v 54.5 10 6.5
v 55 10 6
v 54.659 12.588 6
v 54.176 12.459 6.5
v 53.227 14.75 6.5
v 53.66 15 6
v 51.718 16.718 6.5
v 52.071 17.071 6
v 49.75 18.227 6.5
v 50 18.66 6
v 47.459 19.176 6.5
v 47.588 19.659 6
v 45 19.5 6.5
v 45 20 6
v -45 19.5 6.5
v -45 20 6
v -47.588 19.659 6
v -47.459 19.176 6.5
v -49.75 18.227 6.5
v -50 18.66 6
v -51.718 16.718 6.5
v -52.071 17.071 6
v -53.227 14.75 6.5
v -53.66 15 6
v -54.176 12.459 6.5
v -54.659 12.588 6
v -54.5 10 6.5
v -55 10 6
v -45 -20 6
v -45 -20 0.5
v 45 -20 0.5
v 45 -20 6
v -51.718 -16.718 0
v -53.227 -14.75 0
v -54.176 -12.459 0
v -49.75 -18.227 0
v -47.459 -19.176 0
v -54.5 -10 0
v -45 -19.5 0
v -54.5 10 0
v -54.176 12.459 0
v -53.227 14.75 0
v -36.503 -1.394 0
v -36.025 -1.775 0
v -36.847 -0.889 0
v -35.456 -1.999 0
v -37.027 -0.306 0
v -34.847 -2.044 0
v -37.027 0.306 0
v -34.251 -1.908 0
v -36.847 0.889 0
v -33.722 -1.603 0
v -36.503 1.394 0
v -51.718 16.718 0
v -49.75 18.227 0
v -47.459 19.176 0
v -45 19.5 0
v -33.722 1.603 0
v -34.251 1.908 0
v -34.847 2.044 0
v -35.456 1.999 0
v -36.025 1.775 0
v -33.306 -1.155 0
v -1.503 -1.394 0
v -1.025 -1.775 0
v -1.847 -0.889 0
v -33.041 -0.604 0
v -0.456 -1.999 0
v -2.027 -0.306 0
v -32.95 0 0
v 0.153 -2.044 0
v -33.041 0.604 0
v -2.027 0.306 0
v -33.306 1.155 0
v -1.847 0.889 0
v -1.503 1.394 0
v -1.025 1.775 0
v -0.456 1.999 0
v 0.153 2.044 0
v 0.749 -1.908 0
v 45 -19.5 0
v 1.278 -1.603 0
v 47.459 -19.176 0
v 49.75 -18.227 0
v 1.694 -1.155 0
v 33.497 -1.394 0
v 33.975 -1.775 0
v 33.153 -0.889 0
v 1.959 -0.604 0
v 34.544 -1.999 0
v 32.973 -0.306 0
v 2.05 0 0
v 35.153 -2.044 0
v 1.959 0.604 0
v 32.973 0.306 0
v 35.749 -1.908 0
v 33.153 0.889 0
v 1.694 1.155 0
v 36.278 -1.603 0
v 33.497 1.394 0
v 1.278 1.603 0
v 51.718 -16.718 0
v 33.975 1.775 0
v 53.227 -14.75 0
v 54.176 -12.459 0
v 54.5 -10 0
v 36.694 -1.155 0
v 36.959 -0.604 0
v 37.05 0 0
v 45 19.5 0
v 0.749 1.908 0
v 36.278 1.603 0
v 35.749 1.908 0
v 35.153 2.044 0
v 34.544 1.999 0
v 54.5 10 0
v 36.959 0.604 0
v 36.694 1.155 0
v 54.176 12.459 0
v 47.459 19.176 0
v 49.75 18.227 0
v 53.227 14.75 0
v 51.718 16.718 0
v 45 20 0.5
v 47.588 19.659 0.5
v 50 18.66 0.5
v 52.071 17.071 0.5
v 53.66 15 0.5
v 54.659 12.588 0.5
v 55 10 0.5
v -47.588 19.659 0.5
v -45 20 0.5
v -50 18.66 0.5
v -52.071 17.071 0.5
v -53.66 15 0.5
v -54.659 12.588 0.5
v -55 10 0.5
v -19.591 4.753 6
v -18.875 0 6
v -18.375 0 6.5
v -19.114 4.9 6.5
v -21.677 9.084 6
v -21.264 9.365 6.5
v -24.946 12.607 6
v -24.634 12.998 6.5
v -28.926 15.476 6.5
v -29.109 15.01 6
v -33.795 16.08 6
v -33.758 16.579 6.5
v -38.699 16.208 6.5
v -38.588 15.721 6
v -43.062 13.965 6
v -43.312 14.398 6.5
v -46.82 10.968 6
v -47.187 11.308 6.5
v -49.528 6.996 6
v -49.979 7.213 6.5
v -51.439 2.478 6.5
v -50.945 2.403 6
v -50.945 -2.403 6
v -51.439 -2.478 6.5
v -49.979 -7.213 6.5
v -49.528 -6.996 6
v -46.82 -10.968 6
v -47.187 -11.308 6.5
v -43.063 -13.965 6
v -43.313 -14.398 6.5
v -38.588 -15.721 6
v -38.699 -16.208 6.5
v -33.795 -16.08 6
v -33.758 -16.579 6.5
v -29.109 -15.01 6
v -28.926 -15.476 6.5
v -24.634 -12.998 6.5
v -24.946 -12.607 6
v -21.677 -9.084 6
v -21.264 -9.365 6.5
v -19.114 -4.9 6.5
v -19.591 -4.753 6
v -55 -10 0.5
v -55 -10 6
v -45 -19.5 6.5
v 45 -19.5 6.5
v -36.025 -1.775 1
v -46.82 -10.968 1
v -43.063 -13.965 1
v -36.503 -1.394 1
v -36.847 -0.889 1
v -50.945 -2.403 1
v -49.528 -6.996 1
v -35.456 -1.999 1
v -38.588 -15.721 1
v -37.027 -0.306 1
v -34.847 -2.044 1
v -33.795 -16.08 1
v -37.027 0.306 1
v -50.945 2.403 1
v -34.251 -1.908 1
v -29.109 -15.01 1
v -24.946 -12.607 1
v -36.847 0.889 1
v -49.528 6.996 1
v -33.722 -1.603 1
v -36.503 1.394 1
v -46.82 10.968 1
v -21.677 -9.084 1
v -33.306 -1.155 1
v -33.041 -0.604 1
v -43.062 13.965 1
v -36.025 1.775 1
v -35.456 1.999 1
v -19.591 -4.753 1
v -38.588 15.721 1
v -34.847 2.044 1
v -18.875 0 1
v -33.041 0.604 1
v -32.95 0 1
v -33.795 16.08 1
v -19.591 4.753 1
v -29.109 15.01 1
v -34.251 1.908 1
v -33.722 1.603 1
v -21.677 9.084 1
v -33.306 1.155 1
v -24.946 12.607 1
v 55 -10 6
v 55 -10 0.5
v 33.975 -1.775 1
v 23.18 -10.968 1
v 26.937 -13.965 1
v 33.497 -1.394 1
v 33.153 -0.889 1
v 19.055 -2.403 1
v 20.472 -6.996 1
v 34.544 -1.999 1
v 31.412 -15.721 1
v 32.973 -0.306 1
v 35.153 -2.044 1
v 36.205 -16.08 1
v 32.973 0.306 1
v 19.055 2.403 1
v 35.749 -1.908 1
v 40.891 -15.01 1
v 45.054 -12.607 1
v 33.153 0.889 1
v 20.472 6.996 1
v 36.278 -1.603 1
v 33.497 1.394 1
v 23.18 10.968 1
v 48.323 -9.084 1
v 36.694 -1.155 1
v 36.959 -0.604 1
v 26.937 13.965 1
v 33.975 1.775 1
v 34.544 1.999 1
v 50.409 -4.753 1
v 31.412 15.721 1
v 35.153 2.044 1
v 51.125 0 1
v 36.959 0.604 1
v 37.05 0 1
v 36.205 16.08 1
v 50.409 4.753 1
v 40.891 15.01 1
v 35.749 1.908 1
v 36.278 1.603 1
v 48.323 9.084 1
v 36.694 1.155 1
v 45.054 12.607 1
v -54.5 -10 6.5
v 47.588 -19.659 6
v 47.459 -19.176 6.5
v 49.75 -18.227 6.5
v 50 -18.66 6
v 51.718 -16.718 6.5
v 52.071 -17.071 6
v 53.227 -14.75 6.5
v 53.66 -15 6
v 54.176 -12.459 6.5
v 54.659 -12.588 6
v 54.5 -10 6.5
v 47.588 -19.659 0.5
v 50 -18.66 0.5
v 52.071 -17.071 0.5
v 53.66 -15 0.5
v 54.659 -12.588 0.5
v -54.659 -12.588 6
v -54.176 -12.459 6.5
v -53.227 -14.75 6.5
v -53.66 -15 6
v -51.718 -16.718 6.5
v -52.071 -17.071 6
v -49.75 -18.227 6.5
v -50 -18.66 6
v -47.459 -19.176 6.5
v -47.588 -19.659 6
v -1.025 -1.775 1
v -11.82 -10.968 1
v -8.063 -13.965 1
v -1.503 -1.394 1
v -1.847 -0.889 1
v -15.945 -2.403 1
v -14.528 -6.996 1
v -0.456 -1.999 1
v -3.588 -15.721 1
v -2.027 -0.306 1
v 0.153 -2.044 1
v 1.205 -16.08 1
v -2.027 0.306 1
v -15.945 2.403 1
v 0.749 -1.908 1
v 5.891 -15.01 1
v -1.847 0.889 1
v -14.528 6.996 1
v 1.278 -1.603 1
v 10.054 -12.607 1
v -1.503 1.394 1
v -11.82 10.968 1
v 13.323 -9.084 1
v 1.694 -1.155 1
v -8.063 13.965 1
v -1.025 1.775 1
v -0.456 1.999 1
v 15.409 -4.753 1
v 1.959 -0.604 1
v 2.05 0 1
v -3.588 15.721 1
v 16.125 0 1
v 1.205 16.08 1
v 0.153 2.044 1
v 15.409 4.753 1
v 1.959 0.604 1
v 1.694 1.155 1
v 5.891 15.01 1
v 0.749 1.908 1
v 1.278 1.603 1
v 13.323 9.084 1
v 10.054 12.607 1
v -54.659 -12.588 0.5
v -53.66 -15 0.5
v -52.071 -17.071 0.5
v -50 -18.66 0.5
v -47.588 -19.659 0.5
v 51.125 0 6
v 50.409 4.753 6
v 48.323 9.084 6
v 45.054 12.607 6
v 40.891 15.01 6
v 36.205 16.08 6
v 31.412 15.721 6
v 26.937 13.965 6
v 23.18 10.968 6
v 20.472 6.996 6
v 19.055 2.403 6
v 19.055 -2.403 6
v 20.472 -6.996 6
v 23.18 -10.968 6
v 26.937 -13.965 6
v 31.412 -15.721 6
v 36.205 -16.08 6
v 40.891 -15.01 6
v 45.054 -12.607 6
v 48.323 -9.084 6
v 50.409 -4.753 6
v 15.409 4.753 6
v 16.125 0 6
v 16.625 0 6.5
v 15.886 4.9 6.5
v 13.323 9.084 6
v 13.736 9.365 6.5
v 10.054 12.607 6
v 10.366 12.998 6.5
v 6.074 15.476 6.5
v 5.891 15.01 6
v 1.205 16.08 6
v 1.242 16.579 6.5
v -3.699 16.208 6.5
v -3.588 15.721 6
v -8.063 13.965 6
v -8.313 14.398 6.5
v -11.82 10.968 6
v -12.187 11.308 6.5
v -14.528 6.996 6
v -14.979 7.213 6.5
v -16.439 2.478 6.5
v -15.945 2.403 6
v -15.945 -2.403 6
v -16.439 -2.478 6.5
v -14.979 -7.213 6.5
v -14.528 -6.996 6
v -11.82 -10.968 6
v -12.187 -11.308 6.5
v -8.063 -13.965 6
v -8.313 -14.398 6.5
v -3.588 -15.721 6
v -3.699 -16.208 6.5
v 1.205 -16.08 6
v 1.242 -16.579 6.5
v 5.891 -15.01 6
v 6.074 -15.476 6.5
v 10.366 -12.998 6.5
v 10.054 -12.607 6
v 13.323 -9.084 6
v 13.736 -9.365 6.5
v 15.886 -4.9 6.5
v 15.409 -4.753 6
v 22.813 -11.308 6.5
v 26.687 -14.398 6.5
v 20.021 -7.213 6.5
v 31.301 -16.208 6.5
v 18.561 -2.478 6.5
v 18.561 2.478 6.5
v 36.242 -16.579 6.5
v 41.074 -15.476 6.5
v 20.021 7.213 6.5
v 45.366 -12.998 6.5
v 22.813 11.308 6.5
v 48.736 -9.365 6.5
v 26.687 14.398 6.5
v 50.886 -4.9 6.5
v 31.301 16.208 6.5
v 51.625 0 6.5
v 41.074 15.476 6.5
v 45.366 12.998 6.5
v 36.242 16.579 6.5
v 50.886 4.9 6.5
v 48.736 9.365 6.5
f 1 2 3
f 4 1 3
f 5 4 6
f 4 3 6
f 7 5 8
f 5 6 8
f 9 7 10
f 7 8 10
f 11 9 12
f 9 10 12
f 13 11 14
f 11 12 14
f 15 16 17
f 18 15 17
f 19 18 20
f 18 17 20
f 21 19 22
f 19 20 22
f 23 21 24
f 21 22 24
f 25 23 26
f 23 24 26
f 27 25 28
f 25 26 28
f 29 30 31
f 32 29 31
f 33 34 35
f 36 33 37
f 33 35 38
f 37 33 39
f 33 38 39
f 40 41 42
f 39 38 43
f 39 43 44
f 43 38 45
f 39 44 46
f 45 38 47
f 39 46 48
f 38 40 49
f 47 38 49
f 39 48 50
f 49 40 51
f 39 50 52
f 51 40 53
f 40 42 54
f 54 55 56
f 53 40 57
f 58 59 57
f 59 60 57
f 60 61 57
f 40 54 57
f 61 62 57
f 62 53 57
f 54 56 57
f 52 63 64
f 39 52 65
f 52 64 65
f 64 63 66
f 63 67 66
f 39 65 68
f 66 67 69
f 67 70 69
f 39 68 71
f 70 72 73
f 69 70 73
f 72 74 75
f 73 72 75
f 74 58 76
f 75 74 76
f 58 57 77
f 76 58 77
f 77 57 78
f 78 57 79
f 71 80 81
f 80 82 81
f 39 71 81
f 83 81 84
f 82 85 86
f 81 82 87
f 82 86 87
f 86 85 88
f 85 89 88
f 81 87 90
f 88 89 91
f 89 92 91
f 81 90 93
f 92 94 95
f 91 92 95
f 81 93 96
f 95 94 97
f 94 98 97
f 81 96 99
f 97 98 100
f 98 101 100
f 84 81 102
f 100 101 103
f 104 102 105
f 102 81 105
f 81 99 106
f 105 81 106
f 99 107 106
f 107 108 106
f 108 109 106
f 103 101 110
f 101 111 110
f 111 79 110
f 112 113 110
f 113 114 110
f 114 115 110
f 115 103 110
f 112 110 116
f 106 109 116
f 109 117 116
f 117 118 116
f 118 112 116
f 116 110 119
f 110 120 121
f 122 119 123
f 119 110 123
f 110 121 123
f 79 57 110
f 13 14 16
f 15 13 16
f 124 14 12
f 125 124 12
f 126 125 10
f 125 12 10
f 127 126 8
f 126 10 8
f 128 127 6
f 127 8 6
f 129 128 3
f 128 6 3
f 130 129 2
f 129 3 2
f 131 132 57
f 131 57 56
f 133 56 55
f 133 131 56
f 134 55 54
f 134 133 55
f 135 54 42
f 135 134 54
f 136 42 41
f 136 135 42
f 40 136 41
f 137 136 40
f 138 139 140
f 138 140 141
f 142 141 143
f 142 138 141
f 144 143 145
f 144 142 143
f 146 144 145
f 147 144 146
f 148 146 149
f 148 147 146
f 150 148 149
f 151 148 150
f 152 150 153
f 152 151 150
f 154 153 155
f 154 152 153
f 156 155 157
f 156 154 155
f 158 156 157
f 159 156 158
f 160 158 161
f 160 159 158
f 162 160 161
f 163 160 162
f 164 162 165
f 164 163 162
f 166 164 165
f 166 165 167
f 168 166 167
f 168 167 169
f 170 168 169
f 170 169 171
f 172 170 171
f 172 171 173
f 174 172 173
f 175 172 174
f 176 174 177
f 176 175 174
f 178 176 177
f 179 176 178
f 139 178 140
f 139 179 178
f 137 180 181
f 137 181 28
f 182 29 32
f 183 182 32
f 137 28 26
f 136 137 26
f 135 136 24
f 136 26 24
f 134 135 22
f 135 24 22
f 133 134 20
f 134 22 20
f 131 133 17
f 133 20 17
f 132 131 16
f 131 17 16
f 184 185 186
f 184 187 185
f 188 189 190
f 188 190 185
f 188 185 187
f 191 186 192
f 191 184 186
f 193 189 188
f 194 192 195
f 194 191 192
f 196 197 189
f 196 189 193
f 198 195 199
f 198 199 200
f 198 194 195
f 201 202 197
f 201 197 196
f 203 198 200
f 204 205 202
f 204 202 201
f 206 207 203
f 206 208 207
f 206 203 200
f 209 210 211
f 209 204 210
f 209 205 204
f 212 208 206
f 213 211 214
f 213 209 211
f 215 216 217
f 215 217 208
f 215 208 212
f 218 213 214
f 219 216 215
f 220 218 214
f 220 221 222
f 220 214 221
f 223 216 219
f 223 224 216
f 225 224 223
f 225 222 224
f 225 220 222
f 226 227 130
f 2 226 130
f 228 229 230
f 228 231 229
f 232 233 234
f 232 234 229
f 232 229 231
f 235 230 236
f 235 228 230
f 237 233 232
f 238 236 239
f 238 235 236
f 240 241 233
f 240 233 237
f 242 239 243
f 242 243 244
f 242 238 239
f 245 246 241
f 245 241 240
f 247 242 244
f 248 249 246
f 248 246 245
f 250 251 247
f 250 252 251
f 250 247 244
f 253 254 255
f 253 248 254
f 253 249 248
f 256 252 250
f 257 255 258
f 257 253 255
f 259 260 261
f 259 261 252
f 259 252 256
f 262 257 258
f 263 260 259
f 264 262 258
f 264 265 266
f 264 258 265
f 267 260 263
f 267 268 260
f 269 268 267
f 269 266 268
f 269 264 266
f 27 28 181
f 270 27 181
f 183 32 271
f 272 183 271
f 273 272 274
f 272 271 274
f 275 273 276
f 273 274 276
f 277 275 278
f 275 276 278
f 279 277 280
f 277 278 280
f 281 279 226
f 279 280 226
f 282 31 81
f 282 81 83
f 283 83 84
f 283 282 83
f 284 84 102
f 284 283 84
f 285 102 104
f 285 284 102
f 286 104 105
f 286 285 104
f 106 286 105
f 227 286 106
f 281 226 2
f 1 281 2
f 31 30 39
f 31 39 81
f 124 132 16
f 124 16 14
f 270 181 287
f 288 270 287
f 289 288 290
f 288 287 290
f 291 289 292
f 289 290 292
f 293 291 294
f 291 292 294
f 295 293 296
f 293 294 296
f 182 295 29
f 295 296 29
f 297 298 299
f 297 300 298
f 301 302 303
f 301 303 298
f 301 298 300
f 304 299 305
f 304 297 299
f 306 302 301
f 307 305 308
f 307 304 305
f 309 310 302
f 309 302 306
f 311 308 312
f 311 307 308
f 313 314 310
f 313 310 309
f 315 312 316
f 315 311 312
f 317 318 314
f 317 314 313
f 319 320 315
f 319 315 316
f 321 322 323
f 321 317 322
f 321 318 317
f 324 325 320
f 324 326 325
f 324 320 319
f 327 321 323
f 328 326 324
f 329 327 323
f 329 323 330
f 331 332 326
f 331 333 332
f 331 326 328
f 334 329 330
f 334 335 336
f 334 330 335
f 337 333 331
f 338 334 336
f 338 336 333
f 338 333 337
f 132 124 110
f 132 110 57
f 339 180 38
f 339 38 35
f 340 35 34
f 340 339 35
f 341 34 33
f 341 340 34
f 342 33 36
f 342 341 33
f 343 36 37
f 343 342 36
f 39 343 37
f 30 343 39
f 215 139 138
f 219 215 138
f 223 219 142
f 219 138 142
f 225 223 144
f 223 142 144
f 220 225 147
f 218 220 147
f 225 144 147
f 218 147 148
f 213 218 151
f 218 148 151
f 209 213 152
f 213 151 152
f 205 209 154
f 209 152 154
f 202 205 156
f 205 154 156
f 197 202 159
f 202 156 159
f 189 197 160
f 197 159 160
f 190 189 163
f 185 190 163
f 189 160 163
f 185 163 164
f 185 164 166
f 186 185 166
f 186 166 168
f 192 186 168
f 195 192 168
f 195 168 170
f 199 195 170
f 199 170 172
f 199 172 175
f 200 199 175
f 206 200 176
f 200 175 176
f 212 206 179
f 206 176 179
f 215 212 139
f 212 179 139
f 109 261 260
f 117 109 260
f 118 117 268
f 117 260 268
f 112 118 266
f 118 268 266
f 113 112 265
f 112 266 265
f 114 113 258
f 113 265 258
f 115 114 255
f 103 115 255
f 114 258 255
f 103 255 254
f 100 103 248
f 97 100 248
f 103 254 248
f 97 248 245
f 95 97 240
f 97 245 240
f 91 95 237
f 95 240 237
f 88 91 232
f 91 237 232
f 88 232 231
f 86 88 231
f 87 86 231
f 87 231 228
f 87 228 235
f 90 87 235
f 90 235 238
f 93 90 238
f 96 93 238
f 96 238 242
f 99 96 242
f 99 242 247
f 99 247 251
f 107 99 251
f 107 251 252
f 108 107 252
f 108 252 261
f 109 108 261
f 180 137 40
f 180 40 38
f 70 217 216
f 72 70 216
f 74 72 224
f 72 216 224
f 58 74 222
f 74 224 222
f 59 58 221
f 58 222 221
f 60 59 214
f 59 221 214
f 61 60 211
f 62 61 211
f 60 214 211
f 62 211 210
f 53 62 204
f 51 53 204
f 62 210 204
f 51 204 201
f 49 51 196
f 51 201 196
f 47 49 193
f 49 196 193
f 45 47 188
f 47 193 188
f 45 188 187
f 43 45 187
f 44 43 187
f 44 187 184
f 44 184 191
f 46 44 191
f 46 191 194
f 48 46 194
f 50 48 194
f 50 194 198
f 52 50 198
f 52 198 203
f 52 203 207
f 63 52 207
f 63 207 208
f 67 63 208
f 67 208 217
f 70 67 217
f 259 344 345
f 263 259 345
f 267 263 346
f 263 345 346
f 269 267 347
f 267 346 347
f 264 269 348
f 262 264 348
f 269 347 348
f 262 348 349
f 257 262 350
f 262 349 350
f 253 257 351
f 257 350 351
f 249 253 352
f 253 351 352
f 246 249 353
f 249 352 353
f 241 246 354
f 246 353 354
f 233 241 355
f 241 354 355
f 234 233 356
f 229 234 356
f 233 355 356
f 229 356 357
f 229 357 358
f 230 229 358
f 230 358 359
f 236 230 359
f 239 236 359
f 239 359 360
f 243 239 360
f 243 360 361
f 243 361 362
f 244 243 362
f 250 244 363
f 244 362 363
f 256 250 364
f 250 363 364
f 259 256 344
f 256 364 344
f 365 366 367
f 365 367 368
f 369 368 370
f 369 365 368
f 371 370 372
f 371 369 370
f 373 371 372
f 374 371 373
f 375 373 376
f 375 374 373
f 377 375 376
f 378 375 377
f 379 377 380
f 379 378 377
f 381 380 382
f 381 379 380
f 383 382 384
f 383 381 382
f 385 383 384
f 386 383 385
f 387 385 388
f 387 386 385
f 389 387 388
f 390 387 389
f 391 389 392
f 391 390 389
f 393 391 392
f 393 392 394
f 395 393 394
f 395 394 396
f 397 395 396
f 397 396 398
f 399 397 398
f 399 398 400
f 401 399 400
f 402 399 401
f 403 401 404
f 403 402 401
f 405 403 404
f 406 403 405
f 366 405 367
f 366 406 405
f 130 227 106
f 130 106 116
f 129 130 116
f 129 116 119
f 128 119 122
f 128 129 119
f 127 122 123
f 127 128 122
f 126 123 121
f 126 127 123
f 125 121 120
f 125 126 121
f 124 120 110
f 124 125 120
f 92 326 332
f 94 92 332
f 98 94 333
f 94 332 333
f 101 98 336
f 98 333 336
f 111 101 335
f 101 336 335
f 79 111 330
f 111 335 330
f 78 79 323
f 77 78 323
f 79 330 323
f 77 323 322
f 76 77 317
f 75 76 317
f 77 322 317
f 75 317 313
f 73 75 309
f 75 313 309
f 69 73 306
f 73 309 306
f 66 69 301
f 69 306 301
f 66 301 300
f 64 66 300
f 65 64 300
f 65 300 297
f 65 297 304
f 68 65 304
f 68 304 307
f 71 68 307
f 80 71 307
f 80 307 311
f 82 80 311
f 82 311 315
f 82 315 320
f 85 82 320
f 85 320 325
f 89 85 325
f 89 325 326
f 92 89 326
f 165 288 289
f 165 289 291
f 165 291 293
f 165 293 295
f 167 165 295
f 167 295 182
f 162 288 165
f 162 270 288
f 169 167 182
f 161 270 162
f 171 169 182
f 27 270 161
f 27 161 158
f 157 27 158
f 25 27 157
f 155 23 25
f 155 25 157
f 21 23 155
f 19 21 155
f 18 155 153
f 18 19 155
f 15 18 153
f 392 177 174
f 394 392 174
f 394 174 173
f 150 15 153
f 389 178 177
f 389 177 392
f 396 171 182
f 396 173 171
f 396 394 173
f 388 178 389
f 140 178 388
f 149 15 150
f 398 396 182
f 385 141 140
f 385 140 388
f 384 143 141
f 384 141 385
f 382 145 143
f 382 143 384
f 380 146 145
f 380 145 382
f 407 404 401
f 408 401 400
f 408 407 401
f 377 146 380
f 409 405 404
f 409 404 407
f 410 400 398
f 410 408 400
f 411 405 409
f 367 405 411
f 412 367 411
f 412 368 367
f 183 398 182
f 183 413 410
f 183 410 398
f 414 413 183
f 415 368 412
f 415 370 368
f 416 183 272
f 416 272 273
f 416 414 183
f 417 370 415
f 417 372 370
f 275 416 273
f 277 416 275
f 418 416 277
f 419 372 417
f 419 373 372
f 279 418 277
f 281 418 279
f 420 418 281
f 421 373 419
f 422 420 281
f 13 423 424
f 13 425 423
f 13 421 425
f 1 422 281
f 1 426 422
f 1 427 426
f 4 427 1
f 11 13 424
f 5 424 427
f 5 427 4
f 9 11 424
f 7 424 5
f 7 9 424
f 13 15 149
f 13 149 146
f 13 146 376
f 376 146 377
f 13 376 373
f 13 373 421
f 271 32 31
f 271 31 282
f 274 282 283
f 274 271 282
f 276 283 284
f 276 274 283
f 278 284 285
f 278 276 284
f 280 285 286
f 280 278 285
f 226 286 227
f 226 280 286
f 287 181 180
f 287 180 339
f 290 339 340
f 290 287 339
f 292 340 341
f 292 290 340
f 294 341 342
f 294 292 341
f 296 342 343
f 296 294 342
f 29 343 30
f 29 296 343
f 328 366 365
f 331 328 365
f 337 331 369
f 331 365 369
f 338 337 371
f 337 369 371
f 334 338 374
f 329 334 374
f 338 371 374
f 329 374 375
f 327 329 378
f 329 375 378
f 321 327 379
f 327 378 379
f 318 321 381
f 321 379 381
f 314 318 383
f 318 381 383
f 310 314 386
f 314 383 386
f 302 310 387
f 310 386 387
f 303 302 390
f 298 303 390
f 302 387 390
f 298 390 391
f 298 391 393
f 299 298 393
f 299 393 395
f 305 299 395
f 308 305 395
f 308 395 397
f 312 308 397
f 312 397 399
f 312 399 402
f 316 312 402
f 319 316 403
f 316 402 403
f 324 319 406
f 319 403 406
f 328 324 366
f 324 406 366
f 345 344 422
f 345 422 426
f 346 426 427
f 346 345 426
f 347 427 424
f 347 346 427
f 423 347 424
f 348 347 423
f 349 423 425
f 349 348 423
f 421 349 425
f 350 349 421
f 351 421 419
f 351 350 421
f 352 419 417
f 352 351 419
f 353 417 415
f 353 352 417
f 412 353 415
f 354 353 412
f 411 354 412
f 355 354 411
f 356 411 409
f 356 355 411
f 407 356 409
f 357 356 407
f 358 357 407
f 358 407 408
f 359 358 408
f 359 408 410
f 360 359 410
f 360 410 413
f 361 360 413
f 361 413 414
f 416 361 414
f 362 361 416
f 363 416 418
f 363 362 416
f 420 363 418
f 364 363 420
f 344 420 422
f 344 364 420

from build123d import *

# Parameters (mm, degrees)
SKETCH1_W           = 110
SKETCH1_H           = 40
BOSS_EXTRUDE1_DEPTH = 6.5
SKETCH2_R           = 16.125
CUT_EXTRUDE1_DEPTH  = 5.5
FILLET1_R           = 10
SKETCH3_R           = 2.05
CUT_EXTRUDE2_DEPTH  = 59.781374601
CHAMFER1_SIZE       = 0.5


with BuildPart() as part:
    # Sketch1 → Boss-Extrude1 (new body)
    with BuildSketch(Plane.XY):
        Rectangle(SKETCH1_W, SKETCH1_H)
    extrude(amount=BOSS_EXTRUDE1_DEPTH)

    # Sketch2 → Cut-Extrude1 (cut)
    with BuildSketch(Plane.XY.offset(6.5)):
        Circle(SKETCH2_R)
        with Locations((35, 0)):
            Circle(SKETCH2_R)
        with Locations((-35, 0)):
            Circle(SKETCH2_R)
    extrude(amount=-CUT_EXTRUDE1_DEPTH, mode=Mode.SUBTRACT)

    # Fillet1
    fillet1_edges = [part.edges().sort_by_distance(p)[0] for p in [
        (55, -20, 3.25),
        (-55, -20, 3.25),
        (-55, 20, 3.25),
        (55, 20, 3.25),
    ]]
    fillet(fillet1_edges, radius=FILLET1_R)

    # Sketch3 → Cut-Extrude2 (cut, through all)
    with BuildSketch(Plane.XY.offset(1)):
        Circle(SKETCH3_R)
        with Locations((35, 0)):
            Circle(SKETCH3_R)
        with Locations((-35, 0)):
            Circle(SKETCH3_R)
    extrude(amount=-CUT_EXTRUDE2_DEPTH, mode=Mode.SUBTRACT)

    # Chamfer1
    chamfer1_edges = [part.edges().sort_by_distance(p)[0] for p in [
        (-51.125, 0, 6.5),
        (18.875, 0, 6.5),
        (-16.125, 0, 6.5),
        (55, 0, 0),
        (55, 0, 6.5),
        (0, -20, 0),
        (-55, 0, 0),
        (0, 20, 0),
        (-52.071067812, -17.071067812, 0),
        (-52.071067812, 17.071067812, 0),
        (52.071067812, 17.071067812, 0),
        (52.071067812, -17.071067812, 0),
        (0, -20, 6.5),
        (0, 20, 6.5),
        (-55, 0, 6.5),
        (-52.071067812, -17.071067812, 6.5),
        (-52.071067812, 17.071067812, 6.5),
        (52.071067812, 17.071067812, 6.5),
        (52.071067812, -17.071067812, 6.5),
    ]]
    chamfer(chamfer1_edges, length=CHAMFER1_SIZE)


solid = part.part
